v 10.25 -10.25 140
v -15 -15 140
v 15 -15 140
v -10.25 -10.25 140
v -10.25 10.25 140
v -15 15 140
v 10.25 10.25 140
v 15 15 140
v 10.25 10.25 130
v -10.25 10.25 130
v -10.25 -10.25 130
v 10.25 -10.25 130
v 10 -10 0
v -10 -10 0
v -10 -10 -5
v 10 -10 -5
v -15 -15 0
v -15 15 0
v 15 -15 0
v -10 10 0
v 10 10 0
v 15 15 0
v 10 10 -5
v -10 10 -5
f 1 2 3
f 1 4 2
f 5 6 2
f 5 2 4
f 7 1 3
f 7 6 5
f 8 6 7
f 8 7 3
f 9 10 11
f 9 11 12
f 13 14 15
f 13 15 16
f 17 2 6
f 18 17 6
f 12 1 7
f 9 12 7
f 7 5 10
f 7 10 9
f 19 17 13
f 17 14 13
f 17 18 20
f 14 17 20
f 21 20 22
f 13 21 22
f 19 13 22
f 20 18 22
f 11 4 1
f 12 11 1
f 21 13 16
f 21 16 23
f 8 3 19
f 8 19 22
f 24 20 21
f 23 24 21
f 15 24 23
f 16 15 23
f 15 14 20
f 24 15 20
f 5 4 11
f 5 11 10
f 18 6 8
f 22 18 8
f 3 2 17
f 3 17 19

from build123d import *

# Parameters (mm, degrees)
SKETCH1_W           = 30
SKETCH1_H           = 30
BOSS_EXTRUDE1_DEPTH = 140
SKETCH2_W           = 20
SKETCH2_H           = 20
BOSS_EXTRUDE2_DEPTH = 5
SKETCH3_W           = 20.5
SKETCH3_H           = 20.5
CUT_EXTRUDE1_DEPTH  = 10


with BuildPart() as part:
    # Sketch1 → Boss-Extrude1 (new body)
    with BuildSketch(Plane.XY):
        Rectangle(SKETCH1_W, SKETCH1_H)
    extrude(amount=BOSS_EXTRUDE1_DEPTH)

    # Sketch2 → Boss-Extrude2 (add)
    with BuildSketch(Plane.XY):
        Rectangle(SKETCH2_W, SKETCH2_H)
    extrude(amount=-BOSS_EXTRUDE2_DEPTH)

    # Sketch3 → Cut-Extrude1 (cut)
    with BuildSketch(Plane.XY.offset(140)):
        Rectangle(SKETCH3_W, SKETCH3_H)
    extrude(amount=-CUT_EXTRUDE1_DEPTH, mode=Mode.SUBTRACT)


solid = part.part
